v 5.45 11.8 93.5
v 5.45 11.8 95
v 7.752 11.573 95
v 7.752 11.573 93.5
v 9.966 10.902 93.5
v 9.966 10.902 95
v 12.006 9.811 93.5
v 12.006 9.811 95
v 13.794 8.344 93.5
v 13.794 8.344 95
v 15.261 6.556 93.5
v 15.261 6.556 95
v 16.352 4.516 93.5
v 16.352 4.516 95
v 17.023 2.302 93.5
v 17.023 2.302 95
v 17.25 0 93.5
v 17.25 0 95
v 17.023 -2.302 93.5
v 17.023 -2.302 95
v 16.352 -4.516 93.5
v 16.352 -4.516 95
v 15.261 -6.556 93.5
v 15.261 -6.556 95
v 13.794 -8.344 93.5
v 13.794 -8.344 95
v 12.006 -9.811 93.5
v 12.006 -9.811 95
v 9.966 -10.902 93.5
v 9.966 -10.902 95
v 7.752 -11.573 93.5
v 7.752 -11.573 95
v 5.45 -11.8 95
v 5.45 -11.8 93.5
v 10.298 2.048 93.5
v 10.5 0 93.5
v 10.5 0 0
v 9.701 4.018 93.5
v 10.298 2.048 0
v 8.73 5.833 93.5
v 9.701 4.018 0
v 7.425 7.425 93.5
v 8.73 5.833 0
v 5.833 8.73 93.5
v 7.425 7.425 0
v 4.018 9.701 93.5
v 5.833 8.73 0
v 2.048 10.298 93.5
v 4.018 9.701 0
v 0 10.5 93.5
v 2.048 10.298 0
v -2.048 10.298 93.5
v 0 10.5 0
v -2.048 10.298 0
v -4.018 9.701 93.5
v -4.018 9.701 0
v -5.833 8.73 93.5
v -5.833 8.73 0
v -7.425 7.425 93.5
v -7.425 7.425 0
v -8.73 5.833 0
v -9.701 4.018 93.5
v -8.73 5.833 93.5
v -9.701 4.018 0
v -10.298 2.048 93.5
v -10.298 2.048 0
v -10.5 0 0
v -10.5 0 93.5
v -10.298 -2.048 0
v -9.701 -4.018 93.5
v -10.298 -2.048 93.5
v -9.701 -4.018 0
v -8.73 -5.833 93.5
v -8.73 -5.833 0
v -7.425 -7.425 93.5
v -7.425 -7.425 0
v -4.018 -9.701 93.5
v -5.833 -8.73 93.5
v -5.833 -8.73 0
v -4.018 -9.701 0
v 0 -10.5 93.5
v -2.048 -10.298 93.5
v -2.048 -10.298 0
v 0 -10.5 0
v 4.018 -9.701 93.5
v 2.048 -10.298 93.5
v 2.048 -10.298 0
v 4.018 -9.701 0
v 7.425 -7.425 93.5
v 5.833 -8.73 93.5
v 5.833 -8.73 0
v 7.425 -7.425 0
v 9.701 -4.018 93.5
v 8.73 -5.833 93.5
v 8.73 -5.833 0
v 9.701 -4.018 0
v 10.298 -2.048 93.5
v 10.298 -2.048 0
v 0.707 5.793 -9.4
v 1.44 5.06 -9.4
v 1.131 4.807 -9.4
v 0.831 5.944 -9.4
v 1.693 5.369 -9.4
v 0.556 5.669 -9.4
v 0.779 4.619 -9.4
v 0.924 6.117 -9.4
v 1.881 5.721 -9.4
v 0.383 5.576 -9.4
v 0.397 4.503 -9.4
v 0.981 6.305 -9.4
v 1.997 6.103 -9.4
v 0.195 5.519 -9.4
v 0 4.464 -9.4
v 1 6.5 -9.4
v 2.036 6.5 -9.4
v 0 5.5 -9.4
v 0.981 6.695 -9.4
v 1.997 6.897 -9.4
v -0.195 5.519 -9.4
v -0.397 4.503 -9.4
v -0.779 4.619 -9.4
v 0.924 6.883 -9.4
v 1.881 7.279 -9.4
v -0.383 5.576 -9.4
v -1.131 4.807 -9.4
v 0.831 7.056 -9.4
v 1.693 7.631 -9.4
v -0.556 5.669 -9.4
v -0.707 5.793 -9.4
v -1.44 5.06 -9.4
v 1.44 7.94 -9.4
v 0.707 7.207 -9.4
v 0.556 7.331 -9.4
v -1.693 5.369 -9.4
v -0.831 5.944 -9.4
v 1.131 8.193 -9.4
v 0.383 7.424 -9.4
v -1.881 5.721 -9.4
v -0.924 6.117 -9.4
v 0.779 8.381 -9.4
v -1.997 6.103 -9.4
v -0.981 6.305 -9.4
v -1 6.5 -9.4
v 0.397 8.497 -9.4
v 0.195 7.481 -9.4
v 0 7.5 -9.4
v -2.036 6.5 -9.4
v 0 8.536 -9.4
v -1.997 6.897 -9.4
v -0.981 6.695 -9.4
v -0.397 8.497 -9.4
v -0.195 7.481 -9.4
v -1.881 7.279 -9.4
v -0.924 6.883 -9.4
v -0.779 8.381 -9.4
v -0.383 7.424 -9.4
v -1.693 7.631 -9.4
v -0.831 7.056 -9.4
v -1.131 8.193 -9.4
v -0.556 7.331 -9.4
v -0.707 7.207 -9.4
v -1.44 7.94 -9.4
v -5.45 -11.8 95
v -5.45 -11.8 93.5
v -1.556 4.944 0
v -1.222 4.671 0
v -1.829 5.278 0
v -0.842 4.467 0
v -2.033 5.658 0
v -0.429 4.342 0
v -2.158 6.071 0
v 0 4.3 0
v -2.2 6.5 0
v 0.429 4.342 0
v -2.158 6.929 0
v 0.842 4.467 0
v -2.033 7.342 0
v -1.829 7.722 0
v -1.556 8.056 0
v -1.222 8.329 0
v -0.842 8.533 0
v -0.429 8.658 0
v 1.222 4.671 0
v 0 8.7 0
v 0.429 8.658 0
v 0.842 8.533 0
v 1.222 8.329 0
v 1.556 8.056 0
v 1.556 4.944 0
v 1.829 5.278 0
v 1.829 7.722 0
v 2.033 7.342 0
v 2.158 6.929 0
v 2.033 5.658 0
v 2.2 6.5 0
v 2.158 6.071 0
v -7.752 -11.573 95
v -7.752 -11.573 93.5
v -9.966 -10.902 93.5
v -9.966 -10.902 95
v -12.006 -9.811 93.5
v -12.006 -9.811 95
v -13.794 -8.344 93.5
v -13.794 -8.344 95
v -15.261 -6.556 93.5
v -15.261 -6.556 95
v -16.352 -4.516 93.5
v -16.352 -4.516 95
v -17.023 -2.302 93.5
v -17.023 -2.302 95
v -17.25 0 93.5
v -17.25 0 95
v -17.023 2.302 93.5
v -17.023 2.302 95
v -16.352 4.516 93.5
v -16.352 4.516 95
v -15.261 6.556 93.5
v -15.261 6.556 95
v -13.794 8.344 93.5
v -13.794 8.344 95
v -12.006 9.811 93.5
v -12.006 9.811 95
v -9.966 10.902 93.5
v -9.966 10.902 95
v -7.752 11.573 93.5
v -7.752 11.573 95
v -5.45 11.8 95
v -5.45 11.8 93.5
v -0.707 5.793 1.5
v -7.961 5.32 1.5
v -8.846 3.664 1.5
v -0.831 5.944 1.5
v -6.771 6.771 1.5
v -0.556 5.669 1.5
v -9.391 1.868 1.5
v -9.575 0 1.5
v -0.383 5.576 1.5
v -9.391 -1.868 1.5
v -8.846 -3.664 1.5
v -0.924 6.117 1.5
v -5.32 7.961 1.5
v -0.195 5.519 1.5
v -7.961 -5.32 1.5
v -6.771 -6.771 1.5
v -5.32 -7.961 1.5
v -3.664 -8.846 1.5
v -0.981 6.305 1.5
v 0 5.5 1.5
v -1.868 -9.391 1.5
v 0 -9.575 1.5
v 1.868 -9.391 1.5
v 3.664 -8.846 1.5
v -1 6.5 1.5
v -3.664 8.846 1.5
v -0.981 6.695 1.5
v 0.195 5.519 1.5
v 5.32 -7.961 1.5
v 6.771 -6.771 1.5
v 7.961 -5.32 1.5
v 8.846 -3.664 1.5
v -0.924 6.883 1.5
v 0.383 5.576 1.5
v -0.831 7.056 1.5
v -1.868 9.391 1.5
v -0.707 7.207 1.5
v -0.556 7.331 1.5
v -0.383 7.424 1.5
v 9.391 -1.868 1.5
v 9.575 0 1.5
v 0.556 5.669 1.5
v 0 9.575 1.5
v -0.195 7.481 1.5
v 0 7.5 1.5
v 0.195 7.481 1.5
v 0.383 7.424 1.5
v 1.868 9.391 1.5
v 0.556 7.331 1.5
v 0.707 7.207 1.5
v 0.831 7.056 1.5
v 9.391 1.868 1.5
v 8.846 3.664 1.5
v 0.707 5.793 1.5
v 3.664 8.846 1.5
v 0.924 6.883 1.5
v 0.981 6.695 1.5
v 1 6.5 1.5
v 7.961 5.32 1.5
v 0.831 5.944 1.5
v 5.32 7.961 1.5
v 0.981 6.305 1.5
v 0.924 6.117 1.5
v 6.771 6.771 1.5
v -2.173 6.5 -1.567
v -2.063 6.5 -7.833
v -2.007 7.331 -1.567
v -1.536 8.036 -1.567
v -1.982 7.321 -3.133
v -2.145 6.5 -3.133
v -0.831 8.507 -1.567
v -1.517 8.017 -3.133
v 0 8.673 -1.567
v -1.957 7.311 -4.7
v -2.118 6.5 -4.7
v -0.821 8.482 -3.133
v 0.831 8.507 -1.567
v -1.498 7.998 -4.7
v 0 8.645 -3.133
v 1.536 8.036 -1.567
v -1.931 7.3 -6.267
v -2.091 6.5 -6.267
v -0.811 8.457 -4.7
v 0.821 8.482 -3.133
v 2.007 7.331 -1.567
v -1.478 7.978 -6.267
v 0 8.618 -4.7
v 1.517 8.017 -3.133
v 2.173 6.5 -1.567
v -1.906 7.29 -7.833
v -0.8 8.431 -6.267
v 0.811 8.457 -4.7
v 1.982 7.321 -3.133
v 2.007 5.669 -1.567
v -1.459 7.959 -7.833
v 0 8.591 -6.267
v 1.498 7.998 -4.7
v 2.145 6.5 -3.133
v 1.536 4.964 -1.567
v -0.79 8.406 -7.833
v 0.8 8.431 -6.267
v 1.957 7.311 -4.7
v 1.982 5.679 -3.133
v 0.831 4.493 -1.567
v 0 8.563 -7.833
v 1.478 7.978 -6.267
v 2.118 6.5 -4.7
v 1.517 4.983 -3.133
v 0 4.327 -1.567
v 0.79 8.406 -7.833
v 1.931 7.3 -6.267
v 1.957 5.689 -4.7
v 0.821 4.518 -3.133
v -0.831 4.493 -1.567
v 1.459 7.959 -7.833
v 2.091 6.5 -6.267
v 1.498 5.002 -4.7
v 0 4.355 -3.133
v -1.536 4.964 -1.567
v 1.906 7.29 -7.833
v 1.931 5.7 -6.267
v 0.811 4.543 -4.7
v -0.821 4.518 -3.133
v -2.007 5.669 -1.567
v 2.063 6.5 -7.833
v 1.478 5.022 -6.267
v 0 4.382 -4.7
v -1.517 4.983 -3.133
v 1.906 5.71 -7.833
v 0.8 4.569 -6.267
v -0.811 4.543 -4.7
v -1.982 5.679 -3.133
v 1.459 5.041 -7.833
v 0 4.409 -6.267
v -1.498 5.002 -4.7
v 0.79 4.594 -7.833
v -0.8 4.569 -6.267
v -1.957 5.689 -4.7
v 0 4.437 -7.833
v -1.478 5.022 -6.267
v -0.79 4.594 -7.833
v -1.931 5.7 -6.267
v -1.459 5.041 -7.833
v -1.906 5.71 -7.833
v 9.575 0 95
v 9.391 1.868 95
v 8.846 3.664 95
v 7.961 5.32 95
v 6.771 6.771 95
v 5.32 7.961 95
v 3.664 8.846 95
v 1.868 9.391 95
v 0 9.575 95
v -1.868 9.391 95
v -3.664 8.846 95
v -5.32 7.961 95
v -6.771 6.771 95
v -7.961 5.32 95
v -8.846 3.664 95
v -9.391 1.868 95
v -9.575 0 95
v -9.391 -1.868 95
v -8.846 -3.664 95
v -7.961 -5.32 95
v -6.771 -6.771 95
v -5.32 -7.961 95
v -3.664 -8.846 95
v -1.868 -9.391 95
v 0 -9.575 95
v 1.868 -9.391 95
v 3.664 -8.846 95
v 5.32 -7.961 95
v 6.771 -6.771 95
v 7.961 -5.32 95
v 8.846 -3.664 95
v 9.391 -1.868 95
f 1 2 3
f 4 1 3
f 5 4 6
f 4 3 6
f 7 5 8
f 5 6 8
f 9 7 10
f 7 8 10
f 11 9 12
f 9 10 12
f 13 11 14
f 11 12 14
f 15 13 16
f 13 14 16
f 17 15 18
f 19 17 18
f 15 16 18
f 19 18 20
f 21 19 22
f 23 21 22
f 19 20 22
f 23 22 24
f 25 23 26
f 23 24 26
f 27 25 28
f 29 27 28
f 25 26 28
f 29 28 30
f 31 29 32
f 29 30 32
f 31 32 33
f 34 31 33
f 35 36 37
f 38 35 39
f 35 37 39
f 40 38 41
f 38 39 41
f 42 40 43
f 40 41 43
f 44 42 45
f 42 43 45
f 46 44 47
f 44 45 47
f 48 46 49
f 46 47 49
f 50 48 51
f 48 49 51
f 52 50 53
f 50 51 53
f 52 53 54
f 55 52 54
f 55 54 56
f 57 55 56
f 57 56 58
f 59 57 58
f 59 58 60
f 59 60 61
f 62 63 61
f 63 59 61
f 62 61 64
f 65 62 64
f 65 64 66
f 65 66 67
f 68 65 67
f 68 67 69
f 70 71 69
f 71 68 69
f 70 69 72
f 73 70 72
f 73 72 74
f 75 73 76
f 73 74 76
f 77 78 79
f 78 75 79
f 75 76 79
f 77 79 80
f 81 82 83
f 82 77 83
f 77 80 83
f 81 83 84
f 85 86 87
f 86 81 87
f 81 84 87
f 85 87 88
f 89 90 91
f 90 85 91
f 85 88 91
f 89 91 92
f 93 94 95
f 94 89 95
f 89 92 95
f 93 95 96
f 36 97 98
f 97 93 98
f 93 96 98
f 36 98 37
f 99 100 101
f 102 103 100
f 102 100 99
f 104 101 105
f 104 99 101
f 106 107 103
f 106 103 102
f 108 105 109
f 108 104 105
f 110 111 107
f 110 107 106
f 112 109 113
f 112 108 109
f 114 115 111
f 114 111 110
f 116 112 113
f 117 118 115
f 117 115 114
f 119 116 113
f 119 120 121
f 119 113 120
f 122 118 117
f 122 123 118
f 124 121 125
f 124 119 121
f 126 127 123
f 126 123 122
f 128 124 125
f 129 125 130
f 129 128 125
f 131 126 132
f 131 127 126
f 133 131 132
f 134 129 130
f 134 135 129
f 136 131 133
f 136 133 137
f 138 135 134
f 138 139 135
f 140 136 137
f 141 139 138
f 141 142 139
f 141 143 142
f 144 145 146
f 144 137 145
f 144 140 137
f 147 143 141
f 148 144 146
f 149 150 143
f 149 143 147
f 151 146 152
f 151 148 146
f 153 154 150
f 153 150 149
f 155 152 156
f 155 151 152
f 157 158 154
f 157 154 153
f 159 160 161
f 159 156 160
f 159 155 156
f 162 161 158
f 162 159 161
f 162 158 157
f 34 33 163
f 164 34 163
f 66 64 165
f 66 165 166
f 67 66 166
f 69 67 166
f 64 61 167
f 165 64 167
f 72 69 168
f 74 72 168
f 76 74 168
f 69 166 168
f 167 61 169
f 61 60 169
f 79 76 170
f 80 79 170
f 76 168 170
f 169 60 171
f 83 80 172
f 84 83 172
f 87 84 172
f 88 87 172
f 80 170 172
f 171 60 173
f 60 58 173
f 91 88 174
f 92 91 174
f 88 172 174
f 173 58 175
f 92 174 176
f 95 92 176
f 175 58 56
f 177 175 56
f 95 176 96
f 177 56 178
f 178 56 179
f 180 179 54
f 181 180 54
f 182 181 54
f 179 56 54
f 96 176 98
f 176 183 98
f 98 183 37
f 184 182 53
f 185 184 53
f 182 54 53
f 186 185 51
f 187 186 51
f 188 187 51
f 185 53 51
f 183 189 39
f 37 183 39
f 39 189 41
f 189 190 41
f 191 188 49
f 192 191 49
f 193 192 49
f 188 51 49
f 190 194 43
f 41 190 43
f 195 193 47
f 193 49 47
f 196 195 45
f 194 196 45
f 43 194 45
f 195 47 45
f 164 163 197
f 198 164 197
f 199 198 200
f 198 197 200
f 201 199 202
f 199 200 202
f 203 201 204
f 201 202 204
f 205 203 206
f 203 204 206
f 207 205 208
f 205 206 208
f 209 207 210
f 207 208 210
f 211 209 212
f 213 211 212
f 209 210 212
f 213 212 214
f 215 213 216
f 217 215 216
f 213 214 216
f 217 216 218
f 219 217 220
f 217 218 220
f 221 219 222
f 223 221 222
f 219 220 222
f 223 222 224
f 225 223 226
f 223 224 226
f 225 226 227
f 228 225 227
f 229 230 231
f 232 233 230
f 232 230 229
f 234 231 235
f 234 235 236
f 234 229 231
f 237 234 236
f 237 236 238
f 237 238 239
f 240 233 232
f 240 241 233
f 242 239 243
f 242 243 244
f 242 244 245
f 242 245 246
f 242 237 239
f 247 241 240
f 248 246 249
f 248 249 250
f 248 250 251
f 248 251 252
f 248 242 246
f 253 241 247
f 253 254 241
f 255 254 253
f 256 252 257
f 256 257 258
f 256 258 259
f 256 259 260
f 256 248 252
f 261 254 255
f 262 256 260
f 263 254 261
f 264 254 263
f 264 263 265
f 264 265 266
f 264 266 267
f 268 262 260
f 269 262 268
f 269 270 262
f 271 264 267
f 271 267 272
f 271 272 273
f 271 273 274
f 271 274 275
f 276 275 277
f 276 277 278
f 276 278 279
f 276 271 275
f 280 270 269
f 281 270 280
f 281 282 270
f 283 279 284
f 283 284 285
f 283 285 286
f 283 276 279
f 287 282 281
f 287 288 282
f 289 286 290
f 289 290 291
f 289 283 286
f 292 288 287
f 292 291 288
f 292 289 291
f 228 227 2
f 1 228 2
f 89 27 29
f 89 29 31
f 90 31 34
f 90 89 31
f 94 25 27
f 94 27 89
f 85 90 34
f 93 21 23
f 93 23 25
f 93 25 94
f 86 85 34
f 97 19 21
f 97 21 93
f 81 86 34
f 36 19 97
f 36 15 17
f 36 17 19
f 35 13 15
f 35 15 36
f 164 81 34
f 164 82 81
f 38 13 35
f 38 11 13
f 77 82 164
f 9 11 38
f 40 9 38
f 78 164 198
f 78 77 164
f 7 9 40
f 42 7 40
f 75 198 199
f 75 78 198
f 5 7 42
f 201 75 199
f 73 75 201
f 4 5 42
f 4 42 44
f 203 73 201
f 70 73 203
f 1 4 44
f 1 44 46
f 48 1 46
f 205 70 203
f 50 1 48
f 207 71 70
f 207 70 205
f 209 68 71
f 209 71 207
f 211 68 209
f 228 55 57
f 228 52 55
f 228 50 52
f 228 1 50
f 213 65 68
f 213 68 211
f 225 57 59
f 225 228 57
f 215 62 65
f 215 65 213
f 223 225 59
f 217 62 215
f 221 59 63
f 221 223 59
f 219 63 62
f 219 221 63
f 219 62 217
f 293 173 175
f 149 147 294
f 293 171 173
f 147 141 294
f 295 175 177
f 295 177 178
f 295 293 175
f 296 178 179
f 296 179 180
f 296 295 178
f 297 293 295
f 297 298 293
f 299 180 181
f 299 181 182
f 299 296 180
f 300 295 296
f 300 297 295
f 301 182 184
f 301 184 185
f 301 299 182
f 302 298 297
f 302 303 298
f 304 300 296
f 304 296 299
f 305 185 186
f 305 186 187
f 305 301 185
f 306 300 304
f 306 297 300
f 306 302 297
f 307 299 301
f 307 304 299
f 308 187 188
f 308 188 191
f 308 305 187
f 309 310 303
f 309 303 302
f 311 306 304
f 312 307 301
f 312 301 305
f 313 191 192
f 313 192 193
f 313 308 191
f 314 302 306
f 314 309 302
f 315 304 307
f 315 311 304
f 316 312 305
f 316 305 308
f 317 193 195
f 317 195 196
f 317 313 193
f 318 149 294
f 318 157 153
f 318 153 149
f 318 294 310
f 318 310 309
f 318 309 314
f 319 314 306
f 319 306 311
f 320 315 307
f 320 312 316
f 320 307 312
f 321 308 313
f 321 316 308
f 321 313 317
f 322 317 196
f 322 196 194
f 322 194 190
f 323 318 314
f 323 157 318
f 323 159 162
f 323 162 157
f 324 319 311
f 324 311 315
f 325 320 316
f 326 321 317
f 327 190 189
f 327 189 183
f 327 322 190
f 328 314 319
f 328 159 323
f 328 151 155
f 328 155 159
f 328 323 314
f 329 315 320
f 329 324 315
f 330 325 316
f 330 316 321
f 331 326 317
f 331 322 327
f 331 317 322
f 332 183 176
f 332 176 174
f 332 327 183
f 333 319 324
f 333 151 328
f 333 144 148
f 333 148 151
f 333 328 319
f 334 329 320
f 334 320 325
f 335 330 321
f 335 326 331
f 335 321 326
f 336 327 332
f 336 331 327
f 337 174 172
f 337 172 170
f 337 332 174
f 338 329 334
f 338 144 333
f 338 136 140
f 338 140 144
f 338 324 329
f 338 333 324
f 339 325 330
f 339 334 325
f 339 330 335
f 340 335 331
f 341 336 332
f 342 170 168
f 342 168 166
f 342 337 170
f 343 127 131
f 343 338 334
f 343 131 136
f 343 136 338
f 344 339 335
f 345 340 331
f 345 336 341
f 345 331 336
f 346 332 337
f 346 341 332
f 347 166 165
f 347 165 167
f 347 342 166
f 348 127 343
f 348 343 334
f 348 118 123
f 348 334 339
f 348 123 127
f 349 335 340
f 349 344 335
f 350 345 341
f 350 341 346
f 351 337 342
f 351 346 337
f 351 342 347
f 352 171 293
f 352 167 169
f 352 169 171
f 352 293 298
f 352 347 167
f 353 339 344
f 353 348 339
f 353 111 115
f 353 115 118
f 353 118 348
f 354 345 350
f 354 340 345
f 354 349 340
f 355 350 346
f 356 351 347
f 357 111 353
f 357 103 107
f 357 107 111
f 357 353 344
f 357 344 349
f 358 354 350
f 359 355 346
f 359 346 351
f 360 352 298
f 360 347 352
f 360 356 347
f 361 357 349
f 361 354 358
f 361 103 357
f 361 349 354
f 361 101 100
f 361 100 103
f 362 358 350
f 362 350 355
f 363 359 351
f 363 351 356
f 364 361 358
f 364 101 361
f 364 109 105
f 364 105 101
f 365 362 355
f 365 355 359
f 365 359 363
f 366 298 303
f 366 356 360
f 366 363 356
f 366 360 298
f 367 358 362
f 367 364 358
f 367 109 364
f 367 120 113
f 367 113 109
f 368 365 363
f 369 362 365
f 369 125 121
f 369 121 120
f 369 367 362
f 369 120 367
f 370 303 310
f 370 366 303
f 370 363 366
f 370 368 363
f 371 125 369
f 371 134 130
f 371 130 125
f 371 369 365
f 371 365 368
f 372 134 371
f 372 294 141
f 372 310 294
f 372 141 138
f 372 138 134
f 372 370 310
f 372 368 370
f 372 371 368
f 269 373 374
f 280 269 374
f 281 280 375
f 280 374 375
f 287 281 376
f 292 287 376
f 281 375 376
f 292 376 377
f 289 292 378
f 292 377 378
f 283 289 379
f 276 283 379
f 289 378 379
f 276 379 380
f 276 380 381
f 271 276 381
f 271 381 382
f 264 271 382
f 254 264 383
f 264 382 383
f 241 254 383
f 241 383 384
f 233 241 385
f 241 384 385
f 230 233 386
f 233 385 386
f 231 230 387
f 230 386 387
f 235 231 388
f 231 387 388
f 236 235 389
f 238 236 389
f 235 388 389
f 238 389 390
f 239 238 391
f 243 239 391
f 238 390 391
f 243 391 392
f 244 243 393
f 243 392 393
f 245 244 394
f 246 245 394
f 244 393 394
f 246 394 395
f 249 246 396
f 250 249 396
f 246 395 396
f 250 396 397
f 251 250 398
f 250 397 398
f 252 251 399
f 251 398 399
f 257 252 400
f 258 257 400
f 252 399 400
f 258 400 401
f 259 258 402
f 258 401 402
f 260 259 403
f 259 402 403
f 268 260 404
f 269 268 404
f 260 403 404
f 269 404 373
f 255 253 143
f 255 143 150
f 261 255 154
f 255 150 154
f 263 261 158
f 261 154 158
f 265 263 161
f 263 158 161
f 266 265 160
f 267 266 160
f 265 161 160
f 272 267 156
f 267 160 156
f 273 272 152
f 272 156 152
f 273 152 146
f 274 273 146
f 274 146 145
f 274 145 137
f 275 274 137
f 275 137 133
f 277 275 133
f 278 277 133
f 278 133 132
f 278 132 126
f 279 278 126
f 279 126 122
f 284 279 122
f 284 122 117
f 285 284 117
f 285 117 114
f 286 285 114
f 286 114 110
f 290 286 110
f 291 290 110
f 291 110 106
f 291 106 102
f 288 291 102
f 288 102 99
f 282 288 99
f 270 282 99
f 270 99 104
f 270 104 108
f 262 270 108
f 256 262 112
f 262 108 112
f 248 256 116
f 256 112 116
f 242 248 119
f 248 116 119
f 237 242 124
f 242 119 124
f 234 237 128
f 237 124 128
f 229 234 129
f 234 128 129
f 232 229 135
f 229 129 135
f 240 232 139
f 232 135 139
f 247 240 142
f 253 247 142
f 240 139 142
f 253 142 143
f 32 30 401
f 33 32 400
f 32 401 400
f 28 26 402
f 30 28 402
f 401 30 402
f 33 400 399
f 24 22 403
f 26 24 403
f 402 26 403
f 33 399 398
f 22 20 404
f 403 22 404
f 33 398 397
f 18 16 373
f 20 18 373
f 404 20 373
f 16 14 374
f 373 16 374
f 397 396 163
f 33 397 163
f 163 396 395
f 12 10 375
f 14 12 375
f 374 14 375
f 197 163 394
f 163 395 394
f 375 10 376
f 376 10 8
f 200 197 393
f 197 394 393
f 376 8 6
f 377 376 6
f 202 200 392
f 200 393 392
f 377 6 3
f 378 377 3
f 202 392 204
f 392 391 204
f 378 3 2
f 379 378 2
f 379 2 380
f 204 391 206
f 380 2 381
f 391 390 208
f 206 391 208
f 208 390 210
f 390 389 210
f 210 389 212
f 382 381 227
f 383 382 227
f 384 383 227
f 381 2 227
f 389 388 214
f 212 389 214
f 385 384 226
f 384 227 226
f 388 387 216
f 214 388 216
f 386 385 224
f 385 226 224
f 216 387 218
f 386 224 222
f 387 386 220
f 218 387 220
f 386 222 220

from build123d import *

# Parameters (mm, degrees)
SKETCH1_R           = 10.5
BOSS_EXTRUDE1_DEPTH = 95
BOSS_EXTRUDE2_DEPTH = 1.5
SKETCH3_R           = 2.2
BOSS_EXTRUDE3_DEPTH = 9.4
BOSS_EXTRUDE3_TAPER = 1
SKETCH4_R           = 9.575
CUT_EXTRUDE1_DEPTH  = 93.5
SKETCH5_R           = 1
CUT_EXTRUDE2_DEPTH  = 107.471416352


with BuildPart() as part:
    # Sketch1 → Boss-Extrude1 (new body)
    with BuildSketch(Plane.XY):
        Circle(SKETCH1_R)
    extrude(amount=BOSS_EXTRUDE1_DEPTH)

    # Sketch2 → Boss-Extrude2 (add)
    with BuildSketch(Plane.XY.offset(95)):
        with BuildLine():
            Line((5.45, -11.8), (-5.45, -11.8))
            ThreePointArc((-5.45, -11.8), (-17.25, 0), (-5.45, 11.8))
            Line((-5.45, 11.8), (5.45, 11.8))
            ThreePointArc((5.45, 11.8), (17.25, 0), (5.45, -11.8))
        make_face()
    extrude(amount=-BOSS_EXTRUDE2_DEPTH)

    # Sketch3 → Boss-Extrude3 (add)
    with BuildSketch(Plane(origin=(0, 0, 0), x_dir=(-1, 0, 0), z_dir=(0, 0, -1))):
        with Locations((0, 6.5)):
            Circle(SKETCH3_R)
    extrude(amount=BOSS_EXTRUDE3_DEPTH, taper=BOSS_EXTRUDE3_TAPER)

    # Sketch4 → Cut-Extrude1 (cut)
    with BuildSketch(Plane.XY.offset(95)):
        Circle(SKETCH4_R)
    extrude(amount=-CUT_EXTRUDE1_DEPTH, mode=Mode.SUBTRACT)

    # Sketch5 → Cut-Extrude2 (cut, through all)
    with BuildSketch(Plane(origin=(0, 0, -9.4), x_dir=(-1, 0, 0), z_dir=(0, 0, -1))):
        with Locations((0, 6.5)):
            Circle(SKETCH5_R)
    extrude(amount=-CUT_EXTRUDE2_DEPTH, mode=Mode.SUBTRACT)


solid = part.part
